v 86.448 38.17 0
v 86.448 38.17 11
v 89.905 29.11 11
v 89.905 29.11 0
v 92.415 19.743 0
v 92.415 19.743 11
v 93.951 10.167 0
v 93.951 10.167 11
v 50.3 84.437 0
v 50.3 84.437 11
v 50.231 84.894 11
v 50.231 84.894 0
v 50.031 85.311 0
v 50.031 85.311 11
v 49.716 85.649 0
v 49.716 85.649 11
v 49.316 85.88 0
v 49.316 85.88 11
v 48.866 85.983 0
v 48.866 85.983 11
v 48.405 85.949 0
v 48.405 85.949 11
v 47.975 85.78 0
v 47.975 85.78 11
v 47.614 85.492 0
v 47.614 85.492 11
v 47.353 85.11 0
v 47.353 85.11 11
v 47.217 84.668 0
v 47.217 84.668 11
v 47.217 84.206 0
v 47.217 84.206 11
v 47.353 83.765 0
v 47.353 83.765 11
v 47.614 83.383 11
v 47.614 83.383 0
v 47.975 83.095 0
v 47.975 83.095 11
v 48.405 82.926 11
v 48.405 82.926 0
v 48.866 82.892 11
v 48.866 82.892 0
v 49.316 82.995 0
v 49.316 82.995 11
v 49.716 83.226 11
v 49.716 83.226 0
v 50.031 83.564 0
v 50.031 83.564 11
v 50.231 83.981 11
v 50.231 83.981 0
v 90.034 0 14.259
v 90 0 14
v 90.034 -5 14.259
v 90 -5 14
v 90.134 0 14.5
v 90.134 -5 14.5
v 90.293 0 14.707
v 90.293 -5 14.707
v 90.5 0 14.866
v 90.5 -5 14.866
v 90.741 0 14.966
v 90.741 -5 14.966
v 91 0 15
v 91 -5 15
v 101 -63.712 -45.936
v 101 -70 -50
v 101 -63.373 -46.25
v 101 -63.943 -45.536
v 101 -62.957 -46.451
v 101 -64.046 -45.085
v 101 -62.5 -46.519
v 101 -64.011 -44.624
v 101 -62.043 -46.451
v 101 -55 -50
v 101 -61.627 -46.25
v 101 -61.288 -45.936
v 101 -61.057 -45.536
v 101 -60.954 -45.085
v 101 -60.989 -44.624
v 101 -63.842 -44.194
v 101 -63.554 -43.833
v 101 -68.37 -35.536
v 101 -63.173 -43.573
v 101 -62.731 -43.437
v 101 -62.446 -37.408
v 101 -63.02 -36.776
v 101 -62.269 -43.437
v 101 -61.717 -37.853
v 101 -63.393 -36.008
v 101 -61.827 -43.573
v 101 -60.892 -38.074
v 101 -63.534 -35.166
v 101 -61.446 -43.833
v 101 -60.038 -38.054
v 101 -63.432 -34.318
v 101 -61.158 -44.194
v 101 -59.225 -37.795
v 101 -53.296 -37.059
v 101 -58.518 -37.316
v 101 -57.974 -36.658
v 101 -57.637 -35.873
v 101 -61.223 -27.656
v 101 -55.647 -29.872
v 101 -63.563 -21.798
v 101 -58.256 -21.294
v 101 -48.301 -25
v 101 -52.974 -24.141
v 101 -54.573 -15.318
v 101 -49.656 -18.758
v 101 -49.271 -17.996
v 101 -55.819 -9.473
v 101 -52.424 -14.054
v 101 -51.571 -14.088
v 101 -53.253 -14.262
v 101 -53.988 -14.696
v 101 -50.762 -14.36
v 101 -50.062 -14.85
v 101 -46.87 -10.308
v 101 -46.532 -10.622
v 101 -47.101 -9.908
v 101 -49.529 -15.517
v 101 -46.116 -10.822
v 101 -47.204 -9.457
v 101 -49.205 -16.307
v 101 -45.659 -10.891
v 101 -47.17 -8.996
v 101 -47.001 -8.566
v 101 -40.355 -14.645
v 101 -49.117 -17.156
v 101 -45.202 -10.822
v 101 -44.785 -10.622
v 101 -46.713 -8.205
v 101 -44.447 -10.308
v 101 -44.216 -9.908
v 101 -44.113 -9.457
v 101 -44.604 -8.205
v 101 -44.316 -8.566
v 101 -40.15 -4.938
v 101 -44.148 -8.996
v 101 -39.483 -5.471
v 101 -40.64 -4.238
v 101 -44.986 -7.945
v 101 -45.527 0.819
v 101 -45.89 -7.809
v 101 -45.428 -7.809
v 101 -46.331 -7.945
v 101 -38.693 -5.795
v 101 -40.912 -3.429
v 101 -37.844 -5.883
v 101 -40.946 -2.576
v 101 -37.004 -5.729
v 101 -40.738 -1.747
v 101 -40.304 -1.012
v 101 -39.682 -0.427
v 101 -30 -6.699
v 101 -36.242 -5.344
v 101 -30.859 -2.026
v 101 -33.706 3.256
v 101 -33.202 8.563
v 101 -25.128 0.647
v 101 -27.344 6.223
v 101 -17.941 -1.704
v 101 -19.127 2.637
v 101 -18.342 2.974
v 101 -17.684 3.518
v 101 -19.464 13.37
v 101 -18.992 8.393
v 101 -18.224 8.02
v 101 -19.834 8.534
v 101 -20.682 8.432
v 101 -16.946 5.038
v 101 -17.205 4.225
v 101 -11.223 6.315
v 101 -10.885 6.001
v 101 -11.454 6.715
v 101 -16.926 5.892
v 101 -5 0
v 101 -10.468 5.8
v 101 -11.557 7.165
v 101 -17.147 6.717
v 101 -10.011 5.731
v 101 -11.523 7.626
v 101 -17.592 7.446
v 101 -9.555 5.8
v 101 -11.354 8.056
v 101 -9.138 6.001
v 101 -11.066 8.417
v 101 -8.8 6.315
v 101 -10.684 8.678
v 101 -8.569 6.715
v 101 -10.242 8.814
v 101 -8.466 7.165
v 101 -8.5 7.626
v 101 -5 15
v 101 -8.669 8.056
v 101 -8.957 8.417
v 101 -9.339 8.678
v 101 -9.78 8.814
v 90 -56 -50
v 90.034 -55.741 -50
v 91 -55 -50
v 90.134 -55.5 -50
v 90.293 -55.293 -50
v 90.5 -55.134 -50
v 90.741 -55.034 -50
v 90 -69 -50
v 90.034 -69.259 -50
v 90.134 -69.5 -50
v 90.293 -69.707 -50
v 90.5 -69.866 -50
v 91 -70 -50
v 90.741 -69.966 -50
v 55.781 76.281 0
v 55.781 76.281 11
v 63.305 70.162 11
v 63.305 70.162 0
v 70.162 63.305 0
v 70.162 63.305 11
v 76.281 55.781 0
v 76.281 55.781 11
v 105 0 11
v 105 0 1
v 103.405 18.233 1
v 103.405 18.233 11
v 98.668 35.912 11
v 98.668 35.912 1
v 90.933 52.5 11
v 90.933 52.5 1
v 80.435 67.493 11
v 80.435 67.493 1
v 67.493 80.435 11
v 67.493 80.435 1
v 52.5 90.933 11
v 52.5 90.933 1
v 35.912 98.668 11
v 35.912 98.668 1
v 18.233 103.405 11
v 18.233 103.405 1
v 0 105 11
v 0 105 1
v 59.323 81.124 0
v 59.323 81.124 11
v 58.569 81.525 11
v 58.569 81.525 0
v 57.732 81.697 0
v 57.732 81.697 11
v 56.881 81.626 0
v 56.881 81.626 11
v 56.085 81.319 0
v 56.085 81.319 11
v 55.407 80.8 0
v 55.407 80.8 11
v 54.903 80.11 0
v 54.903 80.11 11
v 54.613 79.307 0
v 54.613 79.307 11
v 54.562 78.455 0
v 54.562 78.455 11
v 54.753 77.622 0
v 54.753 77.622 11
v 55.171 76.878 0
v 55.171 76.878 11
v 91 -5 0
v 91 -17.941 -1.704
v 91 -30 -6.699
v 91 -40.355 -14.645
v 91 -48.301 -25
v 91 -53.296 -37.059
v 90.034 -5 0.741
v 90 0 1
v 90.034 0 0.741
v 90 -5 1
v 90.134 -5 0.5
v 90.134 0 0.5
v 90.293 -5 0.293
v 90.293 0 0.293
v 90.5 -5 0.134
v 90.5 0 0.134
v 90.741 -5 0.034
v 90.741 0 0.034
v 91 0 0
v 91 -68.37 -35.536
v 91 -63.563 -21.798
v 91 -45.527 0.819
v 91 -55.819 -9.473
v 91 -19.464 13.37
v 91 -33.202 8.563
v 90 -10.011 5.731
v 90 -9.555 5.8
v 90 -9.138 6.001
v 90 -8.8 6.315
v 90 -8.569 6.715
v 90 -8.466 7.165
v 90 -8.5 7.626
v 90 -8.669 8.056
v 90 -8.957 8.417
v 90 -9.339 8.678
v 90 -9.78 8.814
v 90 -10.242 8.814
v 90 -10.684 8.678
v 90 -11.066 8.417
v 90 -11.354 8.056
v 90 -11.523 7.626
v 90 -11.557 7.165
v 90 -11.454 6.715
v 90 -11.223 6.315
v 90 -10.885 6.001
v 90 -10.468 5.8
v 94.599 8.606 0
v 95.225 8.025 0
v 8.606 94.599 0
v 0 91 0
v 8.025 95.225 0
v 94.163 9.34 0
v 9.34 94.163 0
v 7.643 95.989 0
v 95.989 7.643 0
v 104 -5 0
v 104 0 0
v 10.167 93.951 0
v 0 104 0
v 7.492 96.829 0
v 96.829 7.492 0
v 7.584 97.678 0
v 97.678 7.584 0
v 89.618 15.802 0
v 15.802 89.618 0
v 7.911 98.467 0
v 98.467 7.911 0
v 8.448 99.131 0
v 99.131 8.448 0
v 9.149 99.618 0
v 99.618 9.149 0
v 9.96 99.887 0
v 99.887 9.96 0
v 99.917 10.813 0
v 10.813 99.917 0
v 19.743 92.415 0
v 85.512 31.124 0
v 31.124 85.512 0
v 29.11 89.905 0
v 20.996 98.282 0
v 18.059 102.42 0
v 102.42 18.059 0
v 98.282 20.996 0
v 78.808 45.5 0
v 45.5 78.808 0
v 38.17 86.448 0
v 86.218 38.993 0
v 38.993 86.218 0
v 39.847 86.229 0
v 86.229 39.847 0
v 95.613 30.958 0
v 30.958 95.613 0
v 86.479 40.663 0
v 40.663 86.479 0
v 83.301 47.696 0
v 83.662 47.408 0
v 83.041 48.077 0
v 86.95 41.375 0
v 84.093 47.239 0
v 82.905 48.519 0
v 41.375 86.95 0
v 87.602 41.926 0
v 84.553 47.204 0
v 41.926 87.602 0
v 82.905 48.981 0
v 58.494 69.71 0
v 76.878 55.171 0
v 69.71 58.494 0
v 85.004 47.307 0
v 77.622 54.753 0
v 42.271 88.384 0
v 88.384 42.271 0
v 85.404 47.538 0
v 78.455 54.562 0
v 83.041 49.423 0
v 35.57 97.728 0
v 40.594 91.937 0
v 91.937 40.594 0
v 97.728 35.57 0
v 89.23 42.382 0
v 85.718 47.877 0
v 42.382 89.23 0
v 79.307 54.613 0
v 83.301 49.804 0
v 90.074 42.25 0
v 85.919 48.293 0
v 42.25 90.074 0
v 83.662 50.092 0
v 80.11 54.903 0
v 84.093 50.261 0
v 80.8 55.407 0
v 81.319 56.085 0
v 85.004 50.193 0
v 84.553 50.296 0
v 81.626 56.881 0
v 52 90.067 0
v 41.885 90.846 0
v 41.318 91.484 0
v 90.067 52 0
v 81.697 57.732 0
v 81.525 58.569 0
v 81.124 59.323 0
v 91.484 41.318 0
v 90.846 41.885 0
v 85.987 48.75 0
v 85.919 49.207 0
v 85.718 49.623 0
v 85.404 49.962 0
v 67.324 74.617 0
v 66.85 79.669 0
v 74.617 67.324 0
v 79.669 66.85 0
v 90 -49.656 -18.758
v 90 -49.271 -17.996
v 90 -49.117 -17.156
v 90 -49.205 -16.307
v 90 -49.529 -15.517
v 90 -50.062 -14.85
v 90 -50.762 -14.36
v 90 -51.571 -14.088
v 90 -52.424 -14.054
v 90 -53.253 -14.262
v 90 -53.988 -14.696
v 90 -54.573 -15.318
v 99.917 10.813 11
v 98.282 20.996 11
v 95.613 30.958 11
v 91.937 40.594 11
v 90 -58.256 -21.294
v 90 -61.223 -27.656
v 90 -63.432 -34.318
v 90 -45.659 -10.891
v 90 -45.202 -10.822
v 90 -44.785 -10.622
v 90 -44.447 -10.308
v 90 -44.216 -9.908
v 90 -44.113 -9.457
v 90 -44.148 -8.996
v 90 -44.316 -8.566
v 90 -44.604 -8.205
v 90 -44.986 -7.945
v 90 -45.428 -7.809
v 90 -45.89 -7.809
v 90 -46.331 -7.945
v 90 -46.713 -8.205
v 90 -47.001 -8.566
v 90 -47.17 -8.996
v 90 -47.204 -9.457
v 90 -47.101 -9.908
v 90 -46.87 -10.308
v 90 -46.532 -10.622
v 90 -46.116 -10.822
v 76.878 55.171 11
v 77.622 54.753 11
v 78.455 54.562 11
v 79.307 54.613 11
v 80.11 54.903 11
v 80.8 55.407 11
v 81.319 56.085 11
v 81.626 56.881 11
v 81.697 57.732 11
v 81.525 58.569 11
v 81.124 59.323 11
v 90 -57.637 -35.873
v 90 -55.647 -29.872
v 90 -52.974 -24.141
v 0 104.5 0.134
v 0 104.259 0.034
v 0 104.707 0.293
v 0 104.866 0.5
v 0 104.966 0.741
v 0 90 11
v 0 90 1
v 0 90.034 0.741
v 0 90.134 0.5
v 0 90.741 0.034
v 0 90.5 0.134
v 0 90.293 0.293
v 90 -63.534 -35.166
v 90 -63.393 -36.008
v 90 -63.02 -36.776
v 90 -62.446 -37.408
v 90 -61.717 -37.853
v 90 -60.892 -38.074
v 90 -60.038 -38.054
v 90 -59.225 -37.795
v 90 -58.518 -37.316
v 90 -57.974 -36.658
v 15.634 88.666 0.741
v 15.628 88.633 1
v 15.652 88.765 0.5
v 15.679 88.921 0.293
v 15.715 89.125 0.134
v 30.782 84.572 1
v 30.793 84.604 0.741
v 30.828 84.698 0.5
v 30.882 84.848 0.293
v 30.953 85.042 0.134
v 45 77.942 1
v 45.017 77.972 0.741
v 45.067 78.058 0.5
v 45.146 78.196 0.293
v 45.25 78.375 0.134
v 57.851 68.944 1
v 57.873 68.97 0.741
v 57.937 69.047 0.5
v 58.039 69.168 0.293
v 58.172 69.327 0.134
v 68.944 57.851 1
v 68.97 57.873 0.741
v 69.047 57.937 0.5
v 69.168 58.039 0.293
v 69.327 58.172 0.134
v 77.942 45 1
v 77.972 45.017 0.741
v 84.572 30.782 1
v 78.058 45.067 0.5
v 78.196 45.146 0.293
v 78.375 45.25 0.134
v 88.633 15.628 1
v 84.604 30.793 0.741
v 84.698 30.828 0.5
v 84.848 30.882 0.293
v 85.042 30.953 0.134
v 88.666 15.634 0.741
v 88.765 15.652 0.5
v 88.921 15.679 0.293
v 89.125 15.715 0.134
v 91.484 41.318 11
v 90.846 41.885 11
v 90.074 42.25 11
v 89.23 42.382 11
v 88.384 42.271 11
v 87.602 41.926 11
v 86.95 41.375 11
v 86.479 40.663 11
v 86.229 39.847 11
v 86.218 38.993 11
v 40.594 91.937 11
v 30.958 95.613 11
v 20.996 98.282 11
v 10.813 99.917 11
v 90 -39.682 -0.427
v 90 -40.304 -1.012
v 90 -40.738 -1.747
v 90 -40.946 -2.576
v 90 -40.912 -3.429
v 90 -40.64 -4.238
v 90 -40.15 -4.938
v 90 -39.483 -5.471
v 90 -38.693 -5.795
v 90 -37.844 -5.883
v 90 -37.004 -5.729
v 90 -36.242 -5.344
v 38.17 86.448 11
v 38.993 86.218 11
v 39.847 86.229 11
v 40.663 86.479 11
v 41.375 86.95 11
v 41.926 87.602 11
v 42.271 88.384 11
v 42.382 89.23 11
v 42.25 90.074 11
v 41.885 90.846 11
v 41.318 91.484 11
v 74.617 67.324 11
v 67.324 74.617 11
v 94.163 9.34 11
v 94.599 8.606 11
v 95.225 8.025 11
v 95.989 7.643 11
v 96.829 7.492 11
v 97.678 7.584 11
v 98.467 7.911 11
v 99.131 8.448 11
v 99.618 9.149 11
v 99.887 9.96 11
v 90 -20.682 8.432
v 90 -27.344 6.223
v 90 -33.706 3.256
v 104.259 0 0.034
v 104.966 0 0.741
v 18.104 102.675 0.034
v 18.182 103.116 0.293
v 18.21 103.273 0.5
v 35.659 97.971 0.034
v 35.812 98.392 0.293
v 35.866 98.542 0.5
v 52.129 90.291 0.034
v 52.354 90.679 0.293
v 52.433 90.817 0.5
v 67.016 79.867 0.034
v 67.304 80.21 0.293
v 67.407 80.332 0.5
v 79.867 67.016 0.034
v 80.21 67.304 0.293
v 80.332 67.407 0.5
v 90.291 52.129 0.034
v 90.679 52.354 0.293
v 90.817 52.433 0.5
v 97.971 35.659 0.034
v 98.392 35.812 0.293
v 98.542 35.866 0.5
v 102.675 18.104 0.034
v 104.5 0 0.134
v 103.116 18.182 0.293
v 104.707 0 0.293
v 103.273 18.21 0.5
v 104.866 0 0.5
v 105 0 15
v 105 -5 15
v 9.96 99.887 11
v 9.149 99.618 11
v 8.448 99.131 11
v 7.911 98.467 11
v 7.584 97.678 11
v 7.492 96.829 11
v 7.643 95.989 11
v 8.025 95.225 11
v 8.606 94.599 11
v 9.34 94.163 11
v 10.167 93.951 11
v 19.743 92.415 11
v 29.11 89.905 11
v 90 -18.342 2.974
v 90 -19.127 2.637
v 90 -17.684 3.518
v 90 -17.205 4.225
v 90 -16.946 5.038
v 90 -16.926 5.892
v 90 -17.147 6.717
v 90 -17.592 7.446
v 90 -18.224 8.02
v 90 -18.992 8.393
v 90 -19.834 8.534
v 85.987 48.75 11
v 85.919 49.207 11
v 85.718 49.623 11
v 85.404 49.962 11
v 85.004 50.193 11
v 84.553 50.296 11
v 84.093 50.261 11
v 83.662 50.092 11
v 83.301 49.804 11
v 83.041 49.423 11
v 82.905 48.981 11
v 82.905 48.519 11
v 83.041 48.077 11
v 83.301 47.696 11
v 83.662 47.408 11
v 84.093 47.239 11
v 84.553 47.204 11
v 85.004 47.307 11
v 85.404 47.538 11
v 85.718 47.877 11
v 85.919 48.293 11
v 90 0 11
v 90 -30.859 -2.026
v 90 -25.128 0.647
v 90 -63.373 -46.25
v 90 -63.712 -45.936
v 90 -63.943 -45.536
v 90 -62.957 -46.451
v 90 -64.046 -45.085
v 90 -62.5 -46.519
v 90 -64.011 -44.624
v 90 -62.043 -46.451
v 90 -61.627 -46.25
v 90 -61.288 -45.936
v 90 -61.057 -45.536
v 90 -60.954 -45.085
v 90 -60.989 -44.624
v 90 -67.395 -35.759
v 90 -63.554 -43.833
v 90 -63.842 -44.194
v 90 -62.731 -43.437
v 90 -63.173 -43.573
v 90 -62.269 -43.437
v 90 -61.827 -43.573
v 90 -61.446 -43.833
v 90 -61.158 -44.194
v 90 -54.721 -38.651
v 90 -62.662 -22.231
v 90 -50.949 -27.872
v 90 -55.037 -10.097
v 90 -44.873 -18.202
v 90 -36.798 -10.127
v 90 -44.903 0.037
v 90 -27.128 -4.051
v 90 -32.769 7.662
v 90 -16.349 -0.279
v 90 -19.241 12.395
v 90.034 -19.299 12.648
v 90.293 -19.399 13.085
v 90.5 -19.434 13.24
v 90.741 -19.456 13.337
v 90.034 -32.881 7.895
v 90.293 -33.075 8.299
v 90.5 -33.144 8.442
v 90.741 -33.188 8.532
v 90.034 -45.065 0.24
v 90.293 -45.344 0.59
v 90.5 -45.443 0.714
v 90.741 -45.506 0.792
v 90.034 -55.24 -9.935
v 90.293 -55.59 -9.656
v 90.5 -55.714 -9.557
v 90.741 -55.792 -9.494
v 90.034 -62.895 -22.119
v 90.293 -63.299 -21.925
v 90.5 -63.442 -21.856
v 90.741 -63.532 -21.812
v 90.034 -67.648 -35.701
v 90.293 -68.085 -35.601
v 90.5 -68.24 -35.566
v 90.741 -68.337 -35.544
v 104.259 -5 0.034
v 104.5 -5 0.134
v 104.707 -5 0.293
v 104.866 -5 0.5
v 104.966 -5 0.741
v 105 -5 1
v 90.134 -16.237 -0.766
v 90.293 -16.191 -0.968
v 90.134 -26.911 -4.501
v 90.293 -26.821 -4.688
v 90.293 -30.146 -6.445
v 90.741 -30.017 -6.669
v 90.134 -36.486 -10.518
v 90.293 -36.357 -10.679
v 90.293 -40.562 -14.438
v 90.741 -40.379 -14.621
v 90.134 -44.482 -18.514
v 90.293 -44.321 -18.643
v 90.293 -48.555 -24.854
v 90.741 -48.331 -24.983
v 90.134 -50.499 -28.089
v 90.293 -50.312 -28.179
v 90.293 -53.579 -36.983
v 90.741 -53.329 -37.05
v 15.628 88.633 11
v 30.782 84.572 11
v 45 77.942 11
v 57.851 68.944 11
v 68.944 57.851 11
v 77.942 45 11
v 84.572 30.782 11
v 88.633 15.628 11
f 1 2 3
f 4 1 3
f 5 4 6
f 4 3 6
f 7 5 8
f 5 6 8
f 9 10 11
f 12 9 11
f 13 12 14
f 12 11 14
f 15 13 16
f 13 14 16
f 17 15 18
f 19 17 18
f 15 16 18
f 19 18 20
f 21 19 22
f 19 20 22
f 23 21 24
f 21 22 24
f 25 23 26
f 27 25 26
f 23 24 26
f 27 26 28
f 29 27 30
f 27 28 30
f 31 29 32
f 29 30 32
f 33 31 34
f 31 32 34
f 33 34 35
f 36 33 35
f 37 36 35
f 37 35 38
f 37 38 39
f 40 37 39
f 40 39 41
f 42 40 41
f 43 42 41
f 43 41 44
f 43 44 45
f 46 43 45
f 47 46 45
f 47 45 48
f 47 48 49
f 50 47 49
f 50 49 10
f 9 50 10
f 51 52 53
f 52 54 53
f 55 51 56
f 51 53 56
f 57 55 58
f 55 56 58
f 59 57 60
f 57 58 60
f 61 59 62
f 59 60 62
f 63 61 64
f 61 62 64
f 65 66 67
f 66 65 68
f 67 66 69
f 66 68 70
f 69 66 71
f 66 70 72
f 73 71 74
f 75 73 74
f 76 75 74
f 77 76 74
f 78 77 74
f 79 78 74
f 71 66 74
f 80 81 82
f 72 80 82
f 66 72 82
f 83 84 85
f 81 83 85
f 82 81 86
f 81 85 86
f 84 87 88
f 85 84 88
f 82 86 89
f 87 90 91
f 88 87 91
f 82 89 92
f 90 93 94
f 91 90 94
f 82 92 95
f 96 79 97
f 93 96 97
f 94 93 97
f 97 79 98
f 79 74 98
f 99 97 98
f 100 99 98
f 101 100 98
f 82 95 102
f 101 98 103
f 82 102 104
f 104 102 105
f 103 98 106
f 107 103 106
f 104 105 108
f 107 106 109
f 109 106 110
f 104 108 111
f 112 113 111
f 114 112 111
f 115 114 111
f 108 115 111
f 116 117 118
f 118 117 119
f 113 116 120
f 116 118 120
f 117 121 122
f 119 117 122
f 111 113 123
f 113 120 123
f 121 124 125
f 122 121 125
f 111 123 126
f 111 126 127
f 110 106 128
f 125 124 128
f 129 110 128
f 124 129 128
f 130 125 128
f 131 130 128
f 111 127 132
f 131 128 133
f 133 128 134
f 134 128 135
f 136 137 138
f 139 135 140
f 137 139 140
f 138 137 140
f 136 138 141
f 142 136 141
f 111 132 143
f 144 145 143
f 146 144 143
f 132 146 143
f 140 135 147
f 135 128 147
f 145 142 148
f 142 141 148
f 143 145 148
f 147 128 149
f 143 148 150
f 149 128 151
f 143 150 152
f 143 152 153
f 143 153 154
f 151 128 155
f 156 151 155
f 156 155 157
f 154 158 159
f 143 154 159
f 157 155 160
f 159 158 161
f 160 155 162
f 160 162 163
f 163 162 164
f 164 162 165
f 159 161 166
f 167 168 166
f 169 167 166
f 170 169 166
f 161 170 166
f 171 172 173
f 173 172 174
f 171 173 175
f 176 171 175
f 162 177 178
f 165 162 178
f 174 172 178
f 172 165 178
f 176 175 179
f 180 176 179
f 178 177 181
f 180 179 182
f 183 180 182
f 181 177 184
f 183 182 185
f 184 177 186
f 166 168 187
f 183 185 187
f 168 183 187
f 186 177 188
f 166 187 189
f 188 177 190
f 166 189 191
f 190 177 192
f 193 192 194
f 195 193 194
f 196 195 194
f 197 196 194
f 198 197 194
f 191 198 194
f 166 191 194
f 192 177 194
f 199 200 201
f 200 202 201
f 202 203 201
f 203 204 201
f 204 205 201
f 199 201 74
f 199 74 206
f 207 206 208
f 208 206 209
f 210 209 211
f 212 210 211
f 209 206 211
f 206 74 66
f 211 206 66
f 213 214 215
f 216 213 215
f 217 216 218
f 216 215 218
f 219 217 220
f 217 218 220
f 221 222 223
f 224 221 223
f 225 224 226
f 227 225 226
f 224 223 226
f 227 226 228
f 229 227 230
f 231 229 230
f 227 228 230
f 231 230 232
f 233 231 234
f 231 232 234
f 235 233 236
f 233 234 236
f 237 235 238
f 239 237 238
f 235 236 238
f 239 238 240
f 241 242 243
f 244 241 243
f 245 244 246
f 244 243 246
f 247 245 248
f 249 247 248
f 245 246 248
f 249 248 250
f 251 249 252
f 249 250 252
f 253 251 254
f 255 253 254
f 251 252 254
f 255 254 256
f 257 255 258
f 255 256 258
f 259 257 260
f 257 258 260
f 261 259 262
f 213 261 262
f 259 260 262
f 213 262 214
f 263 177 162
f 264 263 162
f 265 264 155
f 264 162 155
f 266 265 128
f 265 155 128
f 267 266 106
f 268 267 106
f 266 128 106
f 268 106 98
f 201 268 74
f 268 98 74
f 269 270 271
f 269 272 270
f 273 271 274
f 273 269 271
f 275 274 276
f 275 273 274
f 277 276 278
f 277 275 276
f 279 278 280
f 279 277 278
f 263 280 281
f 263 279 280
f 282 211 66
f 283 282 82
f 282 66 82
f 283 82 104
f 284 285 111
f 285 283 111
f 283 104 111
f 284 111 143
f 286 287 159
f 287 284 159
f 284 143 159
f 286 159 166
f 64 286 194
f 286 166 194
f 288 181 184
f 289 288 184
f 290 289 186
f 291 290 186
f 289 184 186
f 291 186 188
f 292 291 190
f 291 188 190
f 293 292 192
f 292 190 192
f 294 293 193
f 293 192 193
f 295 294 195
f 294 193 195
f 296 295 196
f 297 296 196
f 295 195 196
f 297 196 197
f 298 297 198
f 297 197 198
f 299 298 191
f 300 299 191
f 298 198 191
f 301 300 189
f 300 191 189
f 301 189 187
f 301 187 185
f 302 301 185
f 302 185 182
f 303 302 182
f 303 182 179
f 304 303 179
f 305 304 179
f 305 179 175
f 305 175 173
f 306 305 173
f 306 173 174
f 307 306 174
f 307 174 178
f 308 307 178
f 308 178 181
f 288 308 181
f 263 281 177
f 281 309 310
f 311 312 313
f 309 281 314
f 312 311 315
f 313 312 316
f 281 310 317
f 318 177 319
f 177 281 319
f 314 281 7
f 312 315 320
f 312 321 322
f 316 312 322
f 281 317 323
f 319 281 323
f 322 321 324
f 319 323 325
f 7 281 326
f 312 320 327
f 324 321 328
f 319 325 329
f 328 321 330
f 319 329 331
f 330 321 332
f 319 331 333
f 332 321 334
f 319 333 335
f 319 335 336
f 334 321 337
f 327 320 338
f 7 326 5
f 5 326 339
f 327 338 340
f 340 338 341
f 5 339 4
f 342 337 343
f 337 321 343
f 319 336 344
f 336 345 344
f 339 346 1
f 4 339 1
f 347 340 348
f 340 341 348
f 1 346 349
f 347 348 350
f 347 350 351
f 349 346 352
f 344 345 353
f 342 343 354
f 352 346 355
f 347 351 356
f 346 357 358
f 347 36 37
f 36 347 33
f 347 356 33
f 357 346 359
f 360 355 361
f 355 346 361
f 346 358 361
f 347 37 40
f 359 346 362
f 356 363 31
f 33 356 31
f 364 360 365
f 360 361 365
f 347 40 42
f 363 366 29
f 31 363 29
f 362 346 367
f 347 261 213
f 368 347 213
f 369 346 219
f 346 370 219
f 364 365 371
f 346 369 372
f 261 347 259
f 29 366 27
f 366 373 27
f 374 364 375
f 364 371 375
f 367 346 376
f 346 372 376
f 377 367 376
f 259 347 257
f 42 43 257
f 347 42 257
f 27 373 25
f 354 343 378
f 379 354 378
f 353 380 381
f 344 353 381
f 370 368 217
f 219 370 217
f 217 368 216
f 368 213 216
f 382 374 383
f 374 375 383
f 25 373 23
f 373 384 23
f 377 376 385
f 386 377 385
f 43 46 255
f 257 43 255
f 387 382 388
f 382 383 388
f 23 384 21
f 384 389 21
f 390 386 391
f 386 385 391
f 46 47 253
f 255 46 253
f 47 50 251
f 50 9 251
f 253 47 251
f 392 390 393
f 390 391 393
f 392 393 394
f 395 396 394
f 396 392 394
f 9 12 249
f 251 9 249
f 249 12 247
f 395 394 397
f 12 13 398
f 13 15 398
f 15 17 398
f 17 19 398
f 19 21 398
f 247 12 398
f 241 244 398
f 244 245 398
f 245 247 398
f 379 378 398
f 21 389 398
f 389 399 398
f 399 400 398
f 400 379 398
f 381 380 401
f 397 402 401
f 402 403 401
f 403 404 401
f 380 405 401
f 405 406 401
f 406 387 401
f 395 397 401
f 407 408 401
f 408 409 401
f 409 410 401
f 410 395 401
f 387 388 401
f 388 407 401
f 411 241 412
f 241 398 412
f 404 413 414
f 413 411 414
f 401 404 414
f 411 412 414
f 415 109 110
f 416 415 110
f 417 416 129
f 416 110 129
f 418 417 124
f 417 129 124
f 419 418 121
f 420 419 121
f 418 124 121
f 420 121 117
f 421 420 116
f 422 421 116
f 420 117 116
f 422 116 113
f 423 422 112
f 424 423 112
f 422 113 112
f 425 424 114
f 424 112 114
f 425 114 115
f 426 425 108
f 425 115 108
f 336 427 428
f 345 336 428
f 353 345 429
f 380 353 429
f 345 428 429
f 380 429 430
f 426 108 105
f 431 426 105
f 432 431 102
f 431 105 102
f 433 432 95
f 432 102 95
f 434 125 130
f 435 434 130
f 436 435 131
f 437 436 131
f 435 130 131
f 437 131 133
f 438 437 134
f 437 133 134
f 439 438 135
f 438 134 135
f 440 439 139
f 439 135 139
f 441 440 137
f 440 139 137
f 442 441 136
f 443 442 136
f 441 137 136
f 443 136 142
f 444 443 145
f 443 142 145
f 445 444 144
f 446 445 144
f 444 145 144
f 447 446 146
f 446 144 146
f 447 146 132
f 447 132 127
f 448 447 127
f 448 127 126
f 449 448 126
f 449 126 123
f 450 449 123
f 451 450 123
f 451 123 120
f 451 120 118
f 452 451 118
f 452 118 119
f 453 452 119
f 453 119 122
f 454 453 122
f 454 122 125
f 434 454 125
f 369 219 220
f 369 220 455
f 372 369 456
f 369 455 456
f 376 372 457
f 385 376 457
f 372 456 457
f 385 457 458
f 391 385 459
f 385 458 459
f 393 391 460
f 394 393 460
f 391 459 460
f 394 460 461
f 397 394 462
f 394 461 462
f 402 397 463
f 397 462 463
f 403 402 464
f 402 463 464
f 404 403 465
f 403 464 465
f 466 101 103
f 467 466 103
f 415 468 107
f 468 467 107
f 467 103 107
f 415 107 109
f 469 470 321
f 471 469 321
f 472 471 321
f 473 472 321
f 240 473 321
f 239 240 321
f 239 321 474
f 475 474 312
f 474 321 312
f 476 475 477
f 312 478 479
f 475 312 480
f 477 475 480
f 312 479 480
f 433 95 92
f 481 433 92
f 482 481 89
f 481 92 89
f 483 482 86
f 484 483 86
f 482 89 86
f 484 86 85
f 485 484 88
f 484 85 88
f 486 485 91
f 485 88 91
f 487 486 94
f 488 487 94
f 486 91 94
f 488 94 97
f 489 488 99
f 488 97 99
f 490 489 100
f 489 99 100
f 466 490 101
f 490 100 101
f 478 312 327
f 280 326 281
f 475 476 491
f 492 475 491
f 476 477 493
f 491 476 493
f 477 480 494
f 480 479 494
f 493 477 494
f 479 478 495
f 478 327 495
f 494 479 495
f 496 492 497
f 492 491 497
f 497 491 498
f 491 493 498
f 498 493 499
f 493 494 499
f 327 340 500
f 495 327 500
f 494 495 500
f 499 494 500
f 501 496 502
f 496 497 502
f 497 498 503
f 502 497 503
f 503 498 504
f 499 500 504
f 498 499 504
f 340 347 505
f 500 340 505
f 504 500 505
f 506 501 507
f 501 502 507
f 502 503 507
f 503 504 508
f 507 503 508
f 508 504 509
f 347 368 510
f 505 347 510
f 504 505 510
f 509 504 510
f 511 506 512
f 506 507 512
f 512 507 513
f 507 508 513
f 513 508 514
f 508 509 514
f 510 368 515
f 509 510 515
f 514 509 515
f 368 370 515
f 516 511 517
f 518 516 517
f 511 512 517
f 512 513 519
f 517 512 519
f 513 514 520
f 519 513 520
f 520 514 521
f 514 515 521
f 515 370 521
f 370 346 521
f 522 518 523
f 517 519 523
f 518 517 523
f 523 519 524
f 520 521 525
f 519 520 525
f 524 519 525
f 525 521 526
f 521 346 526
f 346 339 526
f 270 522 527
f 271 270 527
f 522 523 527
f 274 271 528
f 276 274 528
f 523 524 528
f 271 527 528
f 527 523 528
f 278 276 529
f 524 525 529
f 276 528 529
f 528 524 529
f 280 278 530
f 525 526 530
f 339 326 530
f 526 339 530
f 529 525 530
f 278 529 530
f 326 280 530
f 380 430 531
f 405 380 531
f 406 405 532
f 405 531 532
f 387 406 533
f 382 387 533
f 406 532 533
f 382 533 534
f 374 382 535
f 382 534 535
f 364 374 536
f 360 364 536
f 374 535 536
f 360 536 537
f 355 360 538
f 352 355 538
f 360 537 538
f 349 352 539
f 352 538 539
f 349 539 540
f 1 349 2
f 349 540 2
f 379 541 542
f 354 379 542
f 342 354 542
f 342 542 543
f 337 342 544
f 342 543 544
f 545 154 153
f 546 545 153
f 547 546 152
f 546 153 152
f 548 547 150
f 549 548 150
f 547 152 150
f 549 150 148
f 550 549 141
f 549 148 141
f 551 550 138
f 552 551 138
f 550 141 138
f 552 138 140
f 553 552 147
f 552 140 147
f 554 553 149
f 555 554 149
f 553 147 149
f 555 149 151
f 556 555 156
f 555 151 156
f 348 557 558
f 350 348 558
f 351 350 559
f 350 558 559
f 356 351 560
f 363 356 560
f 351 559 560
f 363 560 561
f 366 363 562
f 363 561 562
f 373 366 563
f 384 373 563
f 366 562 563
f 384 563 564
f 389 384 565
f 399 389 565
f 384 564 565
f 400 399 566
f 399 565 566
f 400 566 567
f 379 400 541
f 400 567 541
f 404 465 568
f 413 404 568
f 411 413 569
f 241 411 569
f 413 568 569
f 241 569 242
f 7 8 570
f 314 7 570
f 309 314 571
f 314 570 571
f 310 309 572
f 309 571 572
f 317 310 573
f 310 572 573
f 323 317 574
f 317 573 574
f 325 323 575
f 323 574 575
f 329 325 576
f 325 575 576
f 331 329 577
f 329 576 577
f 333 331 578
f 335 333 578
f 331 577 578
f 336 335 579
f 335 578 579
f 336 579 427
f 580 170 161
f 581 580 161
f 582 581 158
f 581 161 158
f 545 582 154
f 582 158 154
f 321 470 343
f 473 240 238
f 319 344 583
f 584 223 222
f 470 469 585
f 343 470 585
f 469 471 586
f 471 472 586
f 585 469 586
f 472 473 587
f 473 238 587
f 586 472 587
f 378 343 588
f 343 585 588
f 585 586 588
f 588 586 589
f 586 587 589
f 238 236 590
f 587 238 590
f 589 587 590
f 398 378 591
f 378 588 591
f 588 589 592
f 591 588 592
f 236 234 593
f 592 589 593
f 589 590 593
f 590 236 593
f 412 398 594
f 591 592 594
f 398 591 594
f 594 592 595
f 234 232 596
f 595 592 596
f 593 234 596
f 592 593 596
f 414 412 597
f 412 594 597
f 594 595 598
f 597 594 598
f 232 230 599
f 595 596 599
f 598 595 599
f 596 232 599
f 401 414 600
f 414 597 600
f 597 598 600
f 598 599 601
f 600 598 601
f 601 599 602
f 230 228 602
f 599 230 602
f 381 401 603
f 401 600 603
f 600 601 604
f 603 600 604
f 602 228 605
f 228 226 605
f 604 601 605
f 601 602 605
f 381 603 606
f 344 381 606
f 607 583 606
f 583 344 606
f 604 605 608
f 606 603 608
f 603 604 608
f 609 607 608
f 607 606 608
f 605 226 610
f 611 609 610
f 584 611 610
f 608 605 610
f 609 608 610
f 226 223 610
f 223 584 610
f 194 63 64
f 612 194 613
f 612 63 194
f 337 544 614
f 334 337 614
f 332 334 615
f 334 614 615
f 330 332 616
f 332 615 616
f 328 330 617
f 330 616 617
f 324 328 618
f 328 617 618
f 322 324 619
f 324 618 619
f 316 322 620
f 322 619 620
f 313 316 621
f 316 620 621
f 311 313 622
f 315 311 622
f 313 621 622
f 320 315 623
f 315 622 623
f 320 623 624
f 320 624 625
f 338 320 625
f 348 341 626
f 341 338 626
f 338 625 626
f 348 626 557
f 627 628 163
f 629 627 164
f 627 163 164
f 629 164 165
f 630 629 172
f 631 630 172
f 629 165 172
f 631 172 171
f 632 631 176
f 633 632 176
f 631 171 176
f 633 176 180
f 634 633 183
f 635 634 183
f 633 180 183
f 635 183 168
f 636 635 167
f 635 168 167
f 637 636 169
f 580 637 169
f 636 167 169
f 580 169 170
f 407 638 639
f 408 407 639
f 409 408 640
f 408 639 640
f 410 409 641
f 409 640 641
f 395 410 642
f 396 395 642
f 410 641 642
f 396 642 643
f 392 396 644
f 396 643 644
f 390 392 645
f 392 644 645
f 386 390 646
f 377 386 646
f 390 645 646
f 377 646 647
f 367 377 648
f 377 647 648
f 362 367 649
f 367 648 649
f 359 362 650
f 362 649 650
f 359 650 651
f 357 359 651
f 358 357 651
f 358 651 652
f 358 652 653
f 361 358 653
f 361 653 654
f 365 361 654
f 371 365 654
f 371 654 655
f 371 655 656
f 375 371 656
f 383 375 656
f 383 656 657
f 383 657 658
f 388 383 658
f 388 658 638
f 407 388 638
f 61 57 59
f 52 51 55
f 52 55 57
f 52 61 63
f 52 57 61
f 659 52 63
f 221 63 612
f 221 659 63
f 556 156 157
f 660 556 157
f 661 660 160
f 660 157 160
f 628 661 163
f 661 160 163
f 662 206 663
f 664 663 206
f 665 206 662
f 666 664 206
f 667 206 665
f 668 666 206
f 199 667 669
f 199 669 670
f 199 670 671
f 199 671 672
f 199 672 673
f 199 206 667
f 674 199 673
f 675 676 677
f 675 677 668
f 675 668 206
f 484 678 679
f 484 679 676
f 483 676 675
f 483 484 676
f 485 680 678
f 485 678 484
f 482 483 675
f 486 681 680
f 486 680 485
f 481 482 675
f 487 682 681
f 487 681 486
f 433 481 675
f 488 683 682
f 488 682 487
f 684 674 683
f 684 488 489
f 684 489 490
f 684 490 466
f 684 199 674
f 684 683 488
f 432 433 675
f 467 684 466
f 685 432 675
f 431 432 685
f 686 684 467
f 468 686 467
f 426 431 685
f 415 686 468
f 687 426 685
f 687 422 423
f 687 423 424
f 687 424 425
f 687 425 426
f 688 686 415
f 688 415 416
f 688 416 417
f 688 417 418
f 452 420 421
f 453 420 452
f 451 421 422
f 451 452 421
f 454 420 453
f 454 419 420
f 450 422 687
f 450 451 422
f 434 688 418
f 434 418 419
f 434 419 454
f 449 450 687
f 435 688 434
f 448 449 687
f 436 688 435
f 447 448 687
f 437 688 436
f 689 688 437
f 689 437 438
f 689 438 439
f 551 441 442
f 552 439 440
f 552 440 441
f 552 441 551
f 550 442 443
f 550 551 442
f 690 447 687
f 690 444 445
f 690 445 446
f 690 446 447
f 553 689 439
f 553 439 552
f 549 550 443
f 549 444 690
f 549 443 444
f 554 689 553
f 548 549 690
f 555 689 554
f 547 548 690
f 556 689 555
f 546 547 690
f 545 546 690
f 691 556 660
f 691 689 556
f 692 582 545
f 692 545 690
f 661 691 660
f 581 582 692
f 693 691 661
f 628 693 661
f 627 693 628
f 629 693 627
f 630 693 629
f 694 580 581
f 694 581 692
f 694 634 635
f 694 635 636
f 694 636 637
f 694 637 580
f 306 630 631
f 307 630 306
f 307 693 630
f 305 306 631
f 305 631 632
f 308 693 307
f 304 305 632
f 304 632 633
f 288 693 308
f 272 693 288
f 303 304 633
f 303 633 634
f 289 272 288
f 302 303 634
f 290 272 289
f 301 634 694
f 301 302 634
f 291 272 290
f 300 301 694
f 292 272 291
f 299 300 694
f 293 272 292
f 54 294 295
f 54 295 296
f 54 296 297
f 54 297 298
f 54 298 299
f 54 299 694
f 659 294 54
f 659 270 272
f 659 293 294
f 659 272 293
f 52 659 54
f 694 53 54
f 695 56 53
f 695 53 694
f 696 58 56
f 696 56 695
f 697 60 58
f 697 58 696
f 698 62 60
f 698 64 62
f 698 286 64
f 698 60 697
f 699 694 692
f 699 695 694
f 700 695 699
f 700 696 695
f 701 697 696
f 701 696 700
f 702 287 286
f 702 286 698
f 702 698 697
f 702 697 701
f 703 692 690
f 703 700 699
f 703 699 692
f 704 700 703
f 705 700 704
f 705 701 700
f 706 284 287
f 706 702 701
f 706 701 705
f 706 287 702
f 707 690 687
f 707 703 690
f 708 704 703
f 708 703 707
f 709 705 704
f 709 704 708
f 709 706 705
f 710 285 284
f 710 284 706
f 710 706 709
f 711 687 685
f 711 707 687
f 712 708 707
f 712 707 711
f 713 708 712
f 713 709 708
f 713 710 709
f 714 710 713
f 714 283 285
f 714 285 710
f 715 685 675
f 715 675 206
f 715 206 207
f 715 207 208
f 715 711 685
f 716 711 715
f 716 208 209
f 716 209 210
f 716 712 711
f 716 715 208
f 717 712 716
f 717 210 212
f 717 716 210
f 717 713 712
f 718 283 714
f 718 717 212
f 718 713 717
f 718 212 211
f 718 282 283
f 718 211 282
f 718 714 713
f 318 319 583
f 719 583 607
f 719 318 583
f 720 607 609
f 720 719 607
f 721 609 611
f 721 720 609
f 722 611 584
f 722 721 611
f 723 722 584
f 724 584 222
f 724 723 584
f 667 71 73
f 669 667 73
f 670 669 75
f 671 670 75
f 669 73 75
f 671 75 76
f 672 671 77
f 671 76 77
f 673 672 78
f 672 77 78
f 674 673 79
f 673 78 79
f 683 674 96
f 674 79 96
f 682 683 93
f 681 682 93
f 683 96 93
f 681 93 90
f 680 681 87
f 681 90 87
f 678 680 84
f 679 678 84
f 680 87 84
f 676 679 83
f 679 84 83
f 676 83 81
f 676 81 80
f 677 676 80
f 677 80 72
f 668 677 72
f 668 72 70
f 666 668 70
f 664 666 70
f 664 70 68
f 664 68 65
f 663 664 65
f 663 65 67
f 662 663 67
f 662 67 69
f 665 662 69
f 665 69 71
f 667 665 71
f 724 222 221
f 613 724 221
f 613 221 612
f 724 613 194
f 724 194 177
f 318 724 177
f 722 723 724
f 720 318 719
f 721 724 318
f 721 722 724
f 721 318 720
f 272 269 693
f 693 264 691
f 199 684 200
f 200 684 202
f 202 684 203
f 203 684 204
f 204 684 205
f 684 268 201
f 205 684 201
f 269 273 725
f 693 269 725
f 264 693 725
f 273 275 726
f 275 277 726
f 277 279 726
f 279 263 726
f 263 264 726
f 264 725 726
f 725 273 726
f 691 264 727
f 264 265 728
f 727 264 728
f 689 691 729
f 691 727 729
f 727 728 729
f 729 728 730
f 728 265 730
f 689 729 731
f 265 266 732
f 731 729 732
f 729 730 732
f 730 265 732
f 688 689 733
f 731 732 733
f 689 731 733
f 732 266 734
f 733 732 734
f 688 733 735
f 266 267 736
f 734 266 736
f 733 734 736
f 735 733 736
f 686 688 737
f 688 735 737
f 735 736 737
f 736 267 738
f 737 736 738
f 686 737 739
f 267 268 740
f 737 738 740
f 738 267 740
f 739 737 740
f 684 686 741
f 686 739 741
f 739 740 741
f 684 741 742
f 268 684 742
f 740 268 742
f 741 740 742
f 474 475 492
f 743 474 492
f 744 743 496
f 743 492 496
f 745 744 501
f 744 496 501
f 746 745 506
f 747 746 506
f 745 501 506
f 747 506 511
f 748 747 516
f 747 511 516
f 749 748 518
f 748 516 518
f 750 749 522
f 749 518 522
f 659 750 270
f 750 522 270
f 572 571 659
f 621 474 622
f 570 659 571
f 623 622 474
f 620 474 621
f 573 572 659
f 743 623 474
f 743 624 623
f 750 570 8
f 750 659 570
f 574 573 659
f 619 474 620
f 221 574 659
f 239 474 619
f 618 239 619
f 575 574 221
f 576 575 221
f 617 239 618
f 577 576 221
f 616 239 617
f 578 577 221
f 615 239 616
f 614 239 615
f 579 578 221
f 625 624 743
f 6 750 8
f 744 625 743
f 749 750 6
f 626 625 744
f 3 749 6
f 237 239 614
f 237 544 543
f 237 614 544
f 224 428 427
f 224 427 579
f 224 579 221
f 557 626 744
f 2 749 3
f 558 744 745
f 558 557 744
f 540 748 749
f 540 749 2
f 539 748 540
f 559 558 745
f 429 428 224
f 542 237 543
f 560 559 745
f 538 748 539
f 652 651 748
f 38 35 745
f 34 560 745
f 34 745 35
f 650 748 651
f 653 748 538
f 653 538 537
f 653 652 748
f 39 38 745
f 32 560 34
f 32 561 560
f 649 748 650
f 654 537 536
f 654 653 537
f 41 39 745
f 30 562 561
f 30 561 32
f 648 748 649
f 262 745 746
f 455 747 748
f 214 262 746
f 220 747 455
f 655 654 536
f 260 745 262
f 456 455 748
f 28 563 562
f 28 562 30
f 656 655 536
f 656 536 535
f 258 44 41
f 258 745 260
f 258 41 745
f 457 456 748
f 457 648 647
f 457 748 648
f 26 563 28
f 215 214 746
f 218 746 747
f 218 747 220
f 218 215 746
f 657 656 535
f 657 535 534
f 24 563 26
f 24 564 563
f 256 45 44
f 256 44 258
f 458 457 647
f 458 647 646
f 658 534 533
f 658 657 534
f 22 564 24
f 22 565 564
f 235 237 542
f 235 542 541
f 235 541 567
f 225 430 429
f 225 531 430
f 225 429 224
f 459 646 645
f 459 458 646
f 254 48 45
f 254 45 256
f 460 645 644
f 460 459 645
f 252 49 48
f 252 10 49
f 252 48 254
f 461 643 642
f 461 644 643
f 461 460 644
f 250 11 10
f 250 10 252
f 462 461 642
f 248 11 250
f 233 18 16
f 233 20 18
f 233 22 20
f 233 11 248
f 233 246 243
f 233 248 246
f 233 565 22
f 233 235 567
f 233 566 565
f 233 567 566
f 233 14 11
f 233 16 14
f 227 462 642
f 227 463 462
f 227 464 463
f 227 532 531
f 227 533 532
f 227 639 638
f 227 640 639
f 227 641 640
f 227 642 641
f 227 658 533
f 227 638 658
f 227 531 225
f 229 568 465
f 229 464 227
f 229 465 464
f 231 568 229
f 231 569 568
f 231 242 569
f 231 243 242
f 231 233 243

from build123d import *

# Parameters (mm, degrees)
EXTRUDE_1_DEPTH     = 15
SKETCH_2_W          = 15
SKETCH_2_H          = 15
EXTRUDE_2_DEPTH     = 5
EXTRUDE_3_DEPTH     = 15
SKETCH_4_R          = 1.55
CUT_EXTRUDE_1_DEPTH = 163.095650774
SKETCH_5_R          = 1.55
CUT_EXTRUDE_2_DEPTH = 157.68439616
CUT_EXTRUDE_3_DEPTH = 4
CUT_EXTRUDE_START   = -4
CUT_EXTRUDE_4_DEPTH = 4
FILLET_1_R          = 1


with BuildPart() as part:
    # 草图1 → 凸台-拉伸1 (new body)
    with BuildSketch(Plane.XY):
        with BuildLine():
            Line((90, 0), (105, 0))
            ThreePointArc((105, 0), (74.246212025, 74.246212025), (0, 105))
            Line((0, 105), (0, 90))
            ThreePointArc((0, 90), (63.639610307, 63.639610307), (90, 0))
        make_face()
    extrude(amount=EXTRUDE_1_DEPTH)

    # 草图2 → 凸台-拉伸2 (add)
    with BuildSketch(Plane.XZ):
        with Locations((97.5, 7.5)):
            Rectangle(SKETCH_2_W, SKETCH_2_H)
    extrude(amount=EXTRUDE_2_DEPTH)

    # 草图3 → 凸台-拉伸3 (add)
    with BuildSketch(Plane(origin=(105, 0, 0), x_dir=(0, 0, -1), z_dir=(1, 0, 0))):
        with BuildLine():
            Line((50, -55), (50, -70))
            ThreePointArc((50, -70), (4.038059223, -50.961940777), (-15, -5))
            Line((-15, -5), (0, -5))
            ThreePointArc((0, -5), (14.644660941, -40.355339059), (50, -55))
        make_face()
    extrude(amount=-EXTRUDE_3_DEPTH)

    # 草图4 → 切除-拉伸1 (cut, through all)
    with BuildSketch(Plane.XY.offset(15)):
        with Locations((84.437476869, 48.75)):
            Circle(SKETCH_4_R)
        with Locations((48.75, 84.437476869)):
            Circle(SKETCH_4_R)
        with BuildLine():
            ThreePointArc((40.593936087, 91.936838933), (26.011314033, 97.075545542), (10.813039575, 99.916606103))
            ThreePointArc((10.813039575, 99.916606103), (7.507677018, 97.256798147), (10.167484974, 93.951435589))
            ThreePointArc((10.167484974, 93.951435589), (24.458399762, 91.279990584), (38.170417515, 86.448072429))
            ThreePointArc((38.170417515, 86.448072429), (42.126560053, 87.980696395), (40.593936087, 91.936838933))
        make_face()
        with BuildLine():
            ThreePointArc((81.123799357, 59.322670016), (71.064231509, 71.064231509), (59.322670016, 81.123799357))
            ThreePointArc((59.322670016, 81.123799357), (55.130238094, 80.473019377), (55.781018075, 76.280587456))
            ThreePointArc((55.781018075, 76.280587456), (66.821590822, 66.821590822), (76.280587456, 55.781018075))
            ThreePointArc((76.280587456, 55.781018075), (80.473019377, 55.130238094), (81.123799357, 59.322670016))
        make_face()
        with BuildLine():
            ThreePointArc((99.916606103, 10.813039575), (97.075545542, 26.011314033), (91.936838933, 40.593936087))
            ThreePointArc((91.936838933, 40.593936087), (87.980696395, 42.126560053), (86.448072429, 38.170417515))
            ThreePointArc((86.448072429, 38.170417515), (91.279990584, 24.458399762), (93.951435589, 10.167484974))
            ThreePointArc((93.951435589, 10.167484974), (97.256798147, 7.507677018), (99.916606103, 10.813039575))
        make_face()
    extrude(amount=-CUT_EXTRUDE_1_DEPTH, mode=Mode.SUBTRACT)

    # 草图5 → 切除-拉伸2 (cut, through all)
    with BuildSketch(Plane(origin=(105, 0, 0), x_dir=(0, 0, -1), z_dir=(1, 0, 0))):
        with Locations((44.969401847, -62.5)):
            Circle(SKETCH_5_R)
        with Locations((9.341360082, -45.658639918)):
            Circle(SKETCH_5_R)
        with Locations((-7.28119514, -10.011455208)):
            Circle(SKETCH_5_R)
        with BuildLine():
            ThreePointArc((-8.432245014, -20.681924073), (-4.831621116, -30.568404835), (0.427426106, -39.681550102))
            ThreePointArc((0.427426106, -39.681550102), (4.605316552, -40.419947976), (5.343714426, -36.24205753))
            ThreePointArc((5.343714426, -36.24205753), (0.606225607, -28.032695265), (-2.637311624, -19.126691933))
            ThreePointArc((-2.637311624, -19.126691933), (-6.312394389, -17.006841308), (-8.432245014, -20.681924073))
        make_face()
        with BuildLine():
            ThreePointArc((15.318449898, -54.572573894), (24.431595165, -59.831621116), (34.318075927, -63.432245014))
            ThreePointArc((34.318075927, -63.432245014), (37.993158692, -61.312394389), (35.873308067, -57.637311624))
            ThreePointArc((35.873308067, -57.637311624), (26.967304735, -54.393774393), (18.75794247, -49.656285574))
            ThreePointArc((18.75794247, -49.656285574), (14.580052024, -50.394683448), (15.318449898, -54.572573894))
        make_face()
    extrude(amount=-CUT_EXTRUDE_2_DEPTH, mode=Mode.SUBTRACT)

    # 草图6 → 切除-拉伸3 (cut)
    with BuildSketch(Plane(origin=(105, 0, 0), x_dir=(0, 0, -1), z_dir=(1, 0, 0))):
        with BuildLine():
            Line((50, -55), (50, -70))
            ThreePointArc((50, -70), (4.038059223, -50.961940777), (-15, -5))
            Line((-15, -5), (0, -5))
            ThreePointArc((0, -5), (14.644660941, -40.355339059), (50, -55))
        make_face()
    extrude(amount=-CUT_EXTRUDE_3_DEPTH, mode=Mode.SUBTRACT)

    # 草图7 → 切除-拉伸4 (cut)
    with BuildSketch(Plane.XY.offset(15).offset(CUT_EXTRUDE_START)):
        with BuildLine():
            Line((0, 105), (0, 90))
            ThreePointArc((0, 90), (63.639610307, 63.639610307), (90, 0))
            Line((90, 0), (105, 0))
            ThreePointArc((105, 0), (74.246212025, 74.246212025), (0, 105))
        make_face()
    extrude(amount=CUT_EXTRUDE_4_DEPTH, mode=Mode.SUBTRACT)

    # 圆角1
    fillet_1_edges = [part.edges().sort_by_distance(p)[0] for p in [
        (90, -2.5, 15),
        (90, -2.5, 0),
        (105, -2.5, 0),
        (90, -40.355339059, -14.644660941),
        (90, -50.961940777, -4.038059223),
        (63.639610307, 63.639610307, 0),
        (74.246212025, 74.246212025, 0),
    ]]
    fillet(fillet_1_edges, radius=FILLET_1_R)


solid = part.part
